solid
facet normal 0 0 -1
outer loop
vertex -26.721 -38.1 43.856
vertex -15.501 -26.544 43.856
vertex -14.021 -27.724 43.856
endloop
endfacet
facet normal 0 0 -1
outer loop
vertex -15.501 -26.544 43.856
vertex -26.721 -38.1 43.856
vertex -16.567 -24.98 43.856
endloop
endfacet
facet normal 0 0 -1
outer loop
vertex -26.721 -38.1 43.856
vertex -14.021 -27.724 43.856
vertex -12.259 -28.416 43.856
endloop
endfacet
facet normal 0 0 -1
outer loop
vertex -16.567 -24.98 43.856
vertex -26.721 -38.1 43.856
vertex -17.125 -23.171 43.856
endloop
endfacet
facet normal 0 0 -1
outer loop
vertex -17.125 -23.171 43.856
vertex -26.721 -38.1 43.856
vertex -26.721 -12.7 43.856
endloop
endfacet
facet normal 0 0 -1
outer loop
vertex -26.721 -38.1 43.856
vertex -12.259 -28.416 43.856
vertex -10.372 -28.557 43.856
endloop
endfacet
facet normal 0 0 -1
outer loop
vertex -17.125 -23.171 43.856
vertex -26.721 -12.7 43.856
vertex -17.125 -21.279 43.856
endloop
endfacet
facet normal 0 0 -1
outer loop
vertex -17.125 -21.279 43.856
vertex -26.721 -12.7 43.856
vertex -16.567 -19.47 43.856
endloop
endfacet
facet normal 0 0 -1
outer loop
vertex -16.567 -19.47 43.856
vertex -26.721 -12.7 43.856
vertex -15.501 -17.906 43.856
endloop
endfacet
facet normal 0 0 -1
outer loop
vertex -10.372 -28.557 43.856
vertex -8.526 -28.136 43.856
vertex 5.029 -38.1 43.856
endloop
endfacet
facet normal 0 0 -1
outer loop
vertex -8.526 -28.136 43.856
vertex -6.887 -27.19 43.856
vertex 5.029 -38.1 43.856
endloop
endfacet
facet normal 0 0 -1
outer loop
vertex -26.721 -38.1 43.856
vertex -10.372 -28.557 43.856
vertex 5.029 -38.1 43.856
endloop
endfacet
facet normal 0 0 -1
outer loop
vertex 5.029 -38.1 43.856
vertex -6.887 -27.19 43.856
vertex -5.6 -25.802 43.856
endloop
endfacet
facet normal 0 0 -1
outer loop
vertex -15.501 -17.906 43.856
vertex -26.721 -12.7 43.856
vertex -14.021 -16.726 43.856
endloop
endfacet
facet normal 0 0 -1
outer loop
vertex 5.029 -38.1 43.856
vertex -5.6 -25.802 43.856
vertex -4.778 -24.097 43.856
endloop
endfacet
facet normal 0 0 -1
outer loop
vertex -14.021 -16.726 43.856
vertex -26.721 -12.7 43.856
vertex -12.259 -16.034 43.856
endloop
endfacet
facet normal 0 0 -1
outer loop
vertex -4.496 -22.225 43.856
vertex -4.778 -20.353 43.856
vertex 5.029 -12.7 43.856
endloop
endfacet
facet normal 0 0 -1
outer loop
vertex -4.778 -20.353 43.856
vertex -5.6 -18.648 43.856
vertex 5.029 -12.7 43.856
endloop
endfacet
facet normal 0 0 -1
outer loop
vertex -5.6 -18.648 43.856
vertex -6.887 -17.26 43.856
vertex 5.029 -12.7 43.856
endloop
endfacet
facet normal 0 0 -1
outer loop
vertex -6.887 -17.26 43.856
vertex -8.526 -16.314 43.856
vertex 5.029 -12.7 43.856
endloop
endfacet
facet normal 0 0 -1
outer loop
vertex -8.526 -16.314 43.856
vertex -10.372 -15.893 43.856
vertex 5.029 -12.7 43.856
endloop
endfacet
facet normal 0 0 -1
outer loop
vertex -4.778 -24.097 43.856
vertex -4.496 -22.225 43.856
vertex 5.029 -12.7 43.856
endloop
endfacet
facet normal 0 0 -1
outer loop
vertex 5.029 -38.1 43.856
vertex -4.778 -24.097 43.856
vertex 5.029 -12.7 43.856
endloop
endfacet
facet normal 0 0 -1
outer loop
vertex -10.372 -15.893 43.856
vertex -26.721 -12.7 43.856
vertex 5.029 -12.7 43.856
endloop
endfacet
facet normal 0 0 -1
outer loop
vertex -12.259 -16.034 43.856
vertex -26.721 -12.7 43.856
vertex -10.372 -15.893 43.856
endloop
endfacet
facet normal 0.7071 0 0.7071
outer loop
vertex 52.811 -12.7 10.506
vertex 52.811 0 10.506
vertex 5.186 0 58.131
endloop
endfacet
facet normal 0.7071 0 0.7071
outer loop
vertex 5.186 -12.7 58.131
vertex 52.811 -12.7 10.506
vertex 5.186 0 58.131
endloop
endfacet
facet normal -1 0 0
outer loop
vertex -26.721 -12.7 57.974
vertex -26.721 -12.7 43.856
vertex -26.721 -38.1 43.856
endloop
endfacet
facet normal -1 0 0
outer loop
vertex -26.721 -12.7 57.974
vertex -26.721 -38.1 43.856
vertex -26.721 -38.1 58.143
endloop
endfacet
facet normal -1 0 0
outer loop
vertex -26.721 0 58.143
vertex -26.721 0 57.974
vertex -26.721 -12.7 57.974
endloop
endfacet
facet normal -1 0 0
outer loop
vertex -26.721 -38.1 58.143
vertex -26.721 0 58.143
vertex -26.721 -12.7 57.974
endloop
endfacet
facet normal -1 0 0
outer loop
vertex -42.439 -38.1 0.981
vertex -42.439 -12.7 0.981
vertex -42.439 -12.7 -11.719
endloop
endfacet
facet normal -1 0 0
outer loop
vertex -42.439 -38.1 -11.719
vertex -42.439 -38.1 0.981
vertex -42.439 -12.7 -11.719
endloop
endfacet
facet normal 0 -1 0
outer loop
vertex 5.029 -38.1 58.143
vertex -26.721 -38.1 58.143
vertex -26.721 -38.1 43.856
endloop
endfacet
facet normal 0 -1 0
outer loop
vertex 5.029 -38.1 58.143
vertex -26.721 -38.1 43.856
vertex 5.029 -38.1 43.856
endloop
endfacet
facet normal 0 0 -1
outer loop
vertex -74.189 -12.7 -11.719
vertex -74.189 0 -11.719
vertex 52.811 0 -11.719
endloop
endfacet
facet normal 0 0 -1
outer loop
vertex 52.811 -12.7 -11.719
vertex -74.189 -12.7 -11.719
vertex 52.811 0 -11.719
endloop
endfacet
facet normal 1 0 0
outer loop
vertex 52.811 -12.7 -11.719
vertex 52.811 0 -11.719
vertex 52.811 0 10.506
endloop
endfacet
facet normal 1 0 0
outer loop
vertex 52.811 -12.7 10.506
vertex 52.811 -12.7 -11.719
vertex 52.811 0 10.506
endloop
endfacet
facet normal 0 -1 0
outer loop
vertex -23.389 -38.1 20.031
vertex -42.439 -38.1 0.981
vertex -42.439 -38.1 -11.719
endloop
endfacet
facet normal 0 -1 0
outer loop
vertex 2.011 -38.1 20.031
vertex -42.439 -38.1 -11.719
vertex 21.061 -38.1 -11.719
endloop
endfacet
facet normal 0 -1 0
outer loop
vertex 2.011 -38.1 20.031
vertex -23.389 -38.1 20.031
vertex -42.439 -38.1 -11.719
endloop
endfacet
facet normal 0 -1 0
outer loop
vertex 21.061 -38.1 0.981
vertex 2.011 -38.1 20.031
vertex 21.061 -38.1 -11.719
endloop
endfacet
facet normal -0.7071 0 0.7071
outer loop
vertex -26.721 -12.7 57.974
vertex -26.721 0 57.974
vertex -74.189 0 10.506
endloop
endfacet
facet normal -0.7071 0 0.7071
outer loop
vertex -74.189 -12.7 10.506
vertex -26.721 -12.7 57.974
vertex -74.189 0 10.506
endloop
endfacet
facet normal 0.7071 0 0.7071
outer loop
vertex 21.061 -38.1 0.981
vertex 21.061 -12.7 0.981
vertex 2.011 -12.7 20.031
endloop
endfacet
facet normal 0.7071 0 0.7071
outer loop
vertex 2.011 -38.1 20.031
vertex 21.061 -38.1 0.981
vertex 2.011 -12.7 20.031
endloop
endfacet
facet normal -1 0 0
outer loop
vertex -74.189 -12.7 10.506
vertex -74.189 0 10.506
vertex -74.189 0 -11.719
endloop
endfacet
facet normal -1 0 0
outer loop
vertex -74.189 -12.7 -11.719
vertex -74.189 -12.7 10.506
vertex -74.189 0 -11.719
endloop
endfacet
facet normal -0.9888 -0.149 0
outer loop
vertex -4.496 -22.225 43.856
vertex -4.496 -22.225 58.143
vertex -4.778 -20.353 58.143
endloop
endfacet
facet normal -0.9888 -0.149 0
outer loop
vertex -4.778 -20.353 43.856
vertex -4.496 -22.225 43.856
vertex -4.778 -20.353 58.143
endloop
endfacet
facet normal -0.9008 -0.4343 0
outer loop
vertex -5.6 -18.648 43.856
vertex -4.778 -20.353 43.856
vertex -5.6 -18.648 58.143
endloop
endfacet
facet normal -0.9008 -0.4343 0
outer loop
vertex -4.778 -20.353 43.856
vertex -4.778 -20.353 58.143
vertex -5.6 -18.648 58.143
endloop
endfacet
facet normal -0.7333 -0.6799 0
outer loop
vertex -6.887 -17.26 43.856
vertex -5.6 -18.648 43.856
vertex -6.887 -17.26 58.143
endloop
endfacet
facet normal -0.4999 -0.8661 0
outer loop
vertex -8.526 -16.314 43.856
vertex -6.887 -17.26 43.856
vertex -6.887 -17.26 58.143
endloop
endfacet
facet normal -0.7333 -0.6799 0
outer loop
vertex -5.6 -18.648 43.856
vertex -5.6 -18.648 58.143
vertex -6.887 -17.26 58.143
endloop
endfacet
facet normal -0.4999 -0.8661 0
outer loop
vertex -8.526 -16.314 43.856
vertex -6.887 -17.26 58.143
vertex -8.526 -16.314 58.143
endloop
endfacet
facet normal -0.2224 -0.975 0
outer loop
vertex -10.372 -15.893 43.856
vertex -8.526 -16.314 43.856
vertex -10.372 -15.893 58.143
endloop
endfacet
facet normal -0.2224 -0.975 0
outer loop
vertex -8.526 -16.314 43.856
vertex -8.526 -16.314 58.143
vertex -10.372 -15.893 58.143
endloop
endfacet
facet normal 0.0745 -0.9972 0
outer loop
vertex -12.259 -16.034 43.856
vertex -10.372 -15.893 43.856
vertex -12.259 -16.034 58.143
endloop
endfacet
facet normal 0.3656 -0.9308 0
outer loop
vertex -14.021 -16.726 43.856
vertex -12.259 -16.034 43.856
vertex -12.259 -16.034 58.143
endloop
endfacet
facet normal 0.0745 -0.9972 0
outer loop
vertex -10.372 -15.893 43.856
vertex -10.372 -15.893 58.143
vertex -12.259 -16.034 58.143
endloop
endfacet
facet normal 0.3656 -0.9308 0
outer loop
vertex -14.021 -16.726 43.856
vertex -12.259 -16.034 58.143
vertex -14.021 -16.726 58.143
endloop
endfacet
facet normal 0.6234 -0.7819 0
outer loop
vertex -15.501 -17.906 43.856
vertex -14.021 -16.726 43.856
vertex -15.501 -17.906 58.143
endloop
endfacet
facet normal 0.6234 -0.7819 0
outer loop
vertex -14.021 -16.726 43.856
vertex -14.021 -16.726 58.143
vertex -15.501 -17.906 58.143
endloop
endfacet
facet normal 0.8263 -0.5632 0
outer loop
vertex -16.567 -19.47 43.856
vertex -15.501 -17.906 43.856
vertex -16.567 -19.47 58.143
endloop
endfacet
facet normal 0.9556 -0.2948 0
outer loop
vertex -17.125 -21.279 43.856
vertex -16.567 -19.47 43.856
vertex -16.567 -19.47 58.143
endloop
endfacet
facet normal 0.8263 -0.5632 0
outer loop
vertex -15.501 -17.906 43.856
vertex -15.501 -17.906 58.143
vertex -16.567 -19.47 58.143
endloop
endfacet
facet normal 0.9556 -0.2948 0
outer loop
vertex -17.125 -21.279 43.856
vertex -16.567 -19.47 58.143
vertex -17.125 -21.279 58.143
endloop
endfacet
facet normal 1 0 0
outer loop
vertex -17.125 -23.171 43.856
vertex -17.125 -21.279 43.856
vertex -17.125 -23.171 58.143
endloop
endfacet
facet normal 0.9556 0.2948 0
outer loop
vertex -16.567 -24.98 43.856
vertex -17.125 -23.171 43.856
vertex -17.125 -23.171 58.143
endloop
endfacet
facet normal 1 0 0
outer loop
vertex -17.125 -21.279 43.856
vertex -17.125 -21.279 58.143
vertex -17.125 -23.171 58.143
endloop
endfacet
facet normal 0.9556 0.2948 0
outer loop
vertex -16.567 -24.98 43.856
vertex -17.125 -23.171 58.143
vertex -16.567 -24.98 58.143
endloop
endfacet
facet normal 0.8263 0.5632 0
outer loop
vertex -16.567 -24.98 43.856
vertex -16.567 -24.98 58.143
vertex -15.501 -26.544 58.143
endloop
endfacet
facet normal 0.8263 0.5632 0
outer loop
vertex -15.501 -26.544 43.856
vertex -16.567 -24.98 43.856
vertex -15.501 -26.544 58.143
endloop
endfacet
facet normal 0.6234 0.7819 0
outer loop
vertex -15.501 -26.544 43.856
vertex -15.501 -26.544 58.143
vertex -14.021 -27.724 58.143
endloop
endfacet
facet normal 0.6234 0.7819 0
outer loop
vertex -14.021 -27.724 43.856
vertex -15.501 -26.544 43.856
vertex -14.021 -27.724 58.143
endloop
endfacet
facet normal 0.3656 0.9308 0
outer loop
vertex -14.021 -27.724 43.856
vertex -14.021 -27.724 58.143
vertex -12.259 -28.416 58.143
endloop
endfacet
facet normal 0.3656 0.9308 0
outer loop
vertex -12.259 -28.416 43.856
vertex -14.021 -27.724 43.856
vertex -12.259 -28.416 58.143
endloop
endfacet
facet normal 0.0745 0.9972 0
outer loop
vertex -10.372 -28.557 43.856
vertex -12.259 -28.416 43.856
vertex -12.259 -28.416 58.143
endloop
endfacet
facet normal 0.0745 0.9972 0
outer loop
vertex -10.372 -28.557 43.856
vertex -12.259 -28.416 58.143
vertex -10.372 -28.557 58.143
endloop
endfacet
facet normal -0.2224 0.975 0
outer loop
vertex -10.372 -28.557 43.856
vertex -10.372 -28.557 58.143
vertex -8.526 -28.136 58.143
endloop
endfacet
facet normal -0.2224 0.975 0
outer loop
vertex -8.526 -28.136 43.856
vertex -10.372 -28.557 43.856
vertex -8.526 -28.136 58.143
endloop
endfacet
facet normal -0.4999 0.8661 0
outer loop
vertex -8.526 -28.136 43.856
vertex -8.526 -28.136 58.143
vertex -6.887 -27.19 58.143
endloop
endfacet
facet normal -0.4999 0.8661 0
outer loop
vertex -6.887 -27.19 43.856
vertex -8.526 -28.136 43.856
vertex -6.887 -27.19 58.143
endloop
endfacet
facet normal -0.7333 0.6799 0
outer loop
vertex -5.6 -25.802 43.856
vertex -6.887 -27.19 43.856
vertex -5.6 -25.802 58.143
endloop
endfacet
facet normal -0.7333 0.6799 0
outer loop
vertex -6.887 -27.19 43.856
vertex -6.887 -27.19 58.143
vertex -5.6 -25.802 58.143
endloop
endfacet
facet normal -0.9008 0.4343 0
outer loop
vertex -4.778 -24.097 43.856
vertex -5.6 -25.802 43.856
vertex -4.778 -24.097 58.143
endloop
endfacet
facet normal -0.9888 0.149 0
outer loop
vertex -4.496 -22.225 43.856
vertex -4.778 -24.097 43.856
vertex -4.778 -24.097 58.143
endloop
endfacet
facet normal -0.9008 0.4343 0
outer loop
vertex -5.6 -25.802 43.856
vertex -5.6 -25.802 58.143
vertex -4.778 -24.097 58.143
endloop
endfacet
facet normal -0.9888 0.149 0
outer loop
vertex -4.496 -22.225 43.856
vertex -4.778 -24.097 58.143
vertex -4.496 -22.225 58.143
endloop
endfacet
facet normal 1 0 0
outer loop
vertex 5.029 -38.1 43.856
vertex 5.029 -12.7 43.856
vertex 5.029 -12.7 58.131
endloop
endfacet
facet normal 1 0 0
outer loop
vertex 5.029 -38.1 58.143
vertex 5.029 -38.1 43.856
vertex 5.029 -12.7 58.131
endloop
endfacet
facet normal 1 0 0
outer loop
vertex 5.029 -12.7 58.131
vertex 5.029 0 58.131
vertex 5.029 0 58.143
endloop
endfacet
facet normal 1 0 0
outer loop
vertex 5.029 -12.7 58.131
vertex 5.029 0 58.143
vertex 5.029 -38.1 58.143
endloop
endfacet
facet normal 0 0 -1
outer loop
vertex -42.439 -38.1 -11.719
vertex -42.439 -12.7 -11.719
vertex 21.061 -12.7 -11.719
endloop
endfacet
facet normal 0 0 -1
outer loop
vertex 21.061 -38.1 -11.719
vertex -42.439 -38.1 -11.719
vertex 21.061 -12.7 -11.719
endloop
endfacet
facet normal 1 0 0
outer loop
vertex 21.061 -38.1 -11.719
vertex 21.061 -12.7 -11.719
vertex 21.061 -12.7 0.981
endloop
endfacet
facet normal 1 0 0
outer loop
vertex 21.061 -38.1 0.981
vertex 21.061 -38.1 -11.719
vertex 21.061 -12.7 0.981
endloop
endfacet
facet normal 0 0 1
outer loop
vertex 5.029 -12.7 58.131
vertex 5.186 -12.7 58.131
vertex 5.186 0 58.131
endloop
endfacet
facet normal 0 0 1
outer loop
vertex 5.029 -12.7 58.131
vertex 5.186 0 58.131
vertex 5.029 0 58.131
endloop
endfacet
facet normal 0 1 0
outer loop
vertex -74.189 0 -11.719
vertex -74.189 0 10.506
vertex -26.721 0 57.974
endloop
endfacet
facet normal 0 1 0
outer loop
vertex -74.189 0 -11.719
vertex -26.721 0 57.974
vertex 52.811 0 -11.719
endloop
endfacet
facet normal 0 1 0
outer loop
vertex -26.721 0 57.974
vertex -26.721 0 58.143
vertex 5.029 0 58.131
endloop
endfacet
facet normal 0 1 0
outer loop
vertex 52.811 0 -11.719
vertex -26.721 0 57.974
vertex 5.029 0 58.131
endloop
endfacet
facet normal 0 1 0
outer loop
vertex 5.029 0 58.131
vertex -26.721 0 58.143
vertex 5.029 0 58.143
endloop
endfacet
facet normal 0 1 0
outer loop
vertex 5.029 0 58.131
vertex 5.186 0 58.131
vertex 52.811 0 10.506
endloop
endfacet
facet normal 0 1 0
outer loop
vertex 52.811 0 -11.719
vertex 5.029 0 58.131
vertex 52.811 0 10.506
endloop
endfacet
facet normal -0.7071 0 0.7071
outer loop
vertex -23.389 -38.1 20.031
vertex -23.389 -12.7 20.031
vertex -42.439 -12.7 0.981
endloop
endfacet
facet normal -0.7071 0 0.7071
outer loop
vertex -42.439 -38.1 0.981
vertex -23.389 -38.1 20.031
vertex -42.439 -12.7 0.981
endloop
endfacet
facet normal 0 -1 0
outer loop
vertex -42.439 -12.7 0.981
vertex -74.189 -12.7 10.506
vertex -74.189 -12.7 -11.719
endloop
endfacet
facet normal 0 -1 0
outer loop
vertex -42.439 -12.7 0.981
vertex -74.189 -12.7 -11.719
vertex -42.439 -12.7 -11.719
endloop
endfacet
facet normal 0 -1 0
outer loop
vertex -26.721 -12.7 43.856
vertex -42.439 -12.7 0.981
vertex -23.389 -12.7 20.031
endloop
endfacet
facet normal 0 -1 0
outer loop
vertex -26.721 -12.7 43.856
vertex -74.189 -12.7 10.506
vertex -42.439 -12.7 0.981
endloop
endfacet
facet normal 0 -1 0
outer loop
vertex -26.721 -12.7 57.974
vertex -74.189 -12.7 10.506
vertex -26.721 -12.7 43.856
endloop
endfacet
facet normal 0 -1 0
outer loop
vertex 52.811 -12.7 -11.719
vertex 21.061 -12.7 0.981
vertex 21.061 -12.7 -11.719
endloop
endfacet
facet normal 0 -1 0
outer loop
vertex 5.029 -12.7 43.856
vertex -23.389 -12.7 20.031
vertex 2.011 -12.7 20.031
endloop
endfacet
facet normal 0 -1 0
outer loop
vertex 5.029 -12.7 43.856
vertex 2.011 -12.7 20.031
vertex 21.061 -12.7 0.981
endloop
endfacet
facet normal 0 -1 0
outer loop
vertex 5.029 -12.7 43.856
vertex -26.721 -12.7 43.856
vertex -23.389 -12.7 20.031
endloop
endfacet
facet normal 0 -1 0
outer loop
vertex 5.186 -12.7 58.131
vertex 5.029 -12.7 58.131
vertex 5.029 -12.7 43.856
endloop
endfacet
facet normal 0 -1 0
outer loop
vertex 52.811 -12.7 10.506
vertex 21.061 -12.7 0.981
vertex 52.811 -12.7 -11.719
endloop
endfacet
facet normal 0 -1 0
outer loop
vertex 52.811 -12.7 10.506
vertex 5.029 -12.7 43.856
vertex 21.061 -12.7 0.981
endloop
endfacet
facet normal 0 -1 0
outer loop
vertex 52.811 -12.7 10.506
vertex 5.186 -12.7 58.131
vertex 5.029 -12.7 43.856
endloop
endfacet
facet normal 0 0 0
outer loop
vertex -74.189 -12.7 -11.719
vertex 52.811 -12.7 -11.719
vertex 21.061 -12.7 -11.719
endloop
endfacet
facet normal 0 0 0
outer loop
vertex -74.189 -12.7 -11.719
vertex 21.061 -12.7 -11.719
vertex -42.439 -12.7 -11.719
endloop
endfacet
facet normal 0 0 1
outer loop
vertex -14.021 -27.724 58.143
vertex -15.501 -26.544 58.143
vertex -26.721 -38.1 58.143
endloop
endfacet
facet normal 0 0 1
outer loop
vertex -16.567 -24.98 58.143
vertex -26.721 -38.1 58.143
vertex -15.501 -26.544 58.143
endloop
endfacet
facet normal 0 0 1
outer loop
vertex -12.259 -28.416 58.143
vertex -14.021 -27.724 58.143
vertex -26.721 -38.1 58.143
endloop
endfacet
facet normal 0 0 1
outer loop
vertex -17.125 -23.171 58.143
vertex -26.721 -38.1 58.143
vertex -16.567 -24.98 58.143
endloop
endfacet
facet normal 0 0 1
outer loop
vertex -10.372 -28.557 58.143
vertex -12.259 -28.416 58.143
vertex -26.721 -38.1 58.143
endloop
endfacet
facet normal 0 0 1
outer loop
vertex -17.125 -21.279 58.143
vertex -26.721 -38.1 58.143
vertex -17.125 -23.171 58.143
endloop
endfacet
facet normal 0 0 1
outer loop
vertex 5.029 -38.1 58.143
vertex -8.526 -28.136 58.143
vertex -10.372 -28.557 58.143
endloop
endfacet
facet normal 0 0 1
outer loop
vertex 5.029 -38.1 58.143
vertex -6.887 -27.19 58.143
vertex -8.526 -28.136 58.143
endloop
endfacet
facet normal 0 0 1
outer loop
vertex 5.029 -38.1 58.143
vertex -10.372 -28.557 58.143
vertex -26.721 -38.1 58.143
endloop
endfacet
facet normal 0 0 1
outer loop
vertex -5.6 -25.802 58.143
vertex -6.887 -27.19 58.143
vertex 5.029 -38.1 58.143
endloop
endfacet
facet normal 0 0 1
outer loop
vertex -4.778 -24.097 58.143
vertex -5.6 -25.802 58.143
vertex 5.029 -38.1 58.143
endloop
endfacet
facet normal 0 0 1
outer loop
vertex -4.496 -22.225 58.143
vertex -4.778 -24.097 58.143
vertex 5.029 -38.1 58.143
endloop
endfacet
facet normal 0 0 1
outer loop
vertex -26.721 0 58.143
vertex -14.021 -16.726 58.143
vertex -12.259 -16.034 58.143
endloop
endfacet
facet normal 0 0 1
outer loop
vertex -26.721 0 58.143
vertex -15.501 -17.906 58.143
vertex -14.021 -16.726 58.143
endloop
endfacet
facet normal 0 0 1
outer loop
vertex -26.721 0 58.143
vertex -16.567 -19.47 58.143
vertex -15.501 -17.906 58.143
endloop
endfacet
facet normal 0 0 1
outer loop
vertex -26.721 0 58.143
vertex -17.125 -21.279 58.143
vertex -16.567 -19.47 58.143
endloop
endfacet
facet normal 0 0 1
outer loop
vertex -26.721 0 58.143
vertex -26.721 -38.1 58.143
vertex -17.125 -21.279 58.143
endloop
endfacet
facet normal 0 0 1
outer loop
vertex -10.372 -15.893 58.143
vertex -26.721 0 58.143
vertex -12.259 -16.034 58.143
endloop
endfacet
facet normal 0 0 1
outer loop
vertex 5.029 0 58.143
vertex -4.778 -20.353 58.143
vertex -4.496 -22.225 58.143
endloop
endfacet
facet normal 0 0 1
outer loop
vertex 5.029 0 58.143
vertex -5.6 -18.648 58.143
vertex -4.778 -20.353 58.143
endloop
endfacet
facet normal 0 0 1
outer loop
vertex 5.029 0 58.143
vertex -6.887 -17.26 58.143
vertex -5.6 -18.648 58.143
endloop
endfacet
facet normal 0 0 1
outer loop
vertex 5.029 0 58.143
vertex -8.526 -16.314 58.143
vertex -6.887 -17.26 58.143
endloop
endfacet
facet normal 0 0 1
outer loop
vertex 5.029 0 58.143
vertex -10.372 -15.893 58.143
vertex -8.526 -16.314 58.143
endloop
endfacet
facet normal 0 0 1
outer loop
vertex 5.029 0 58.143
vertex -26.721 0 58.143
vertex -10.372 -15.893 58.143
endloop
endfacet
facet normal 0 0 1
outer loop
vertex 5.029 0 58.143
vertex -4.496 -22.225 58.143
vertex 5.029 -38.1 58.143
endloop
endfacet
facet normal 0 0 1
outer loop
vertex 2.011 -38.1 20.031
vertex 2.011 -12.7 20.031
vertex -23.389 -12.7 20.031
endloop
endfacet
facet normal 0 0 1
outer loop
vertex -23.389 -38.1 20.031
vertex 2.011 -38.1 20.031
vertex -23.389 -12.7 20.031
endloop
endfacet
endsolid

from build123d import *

# Parameters (mm, degrees)
F1_DEPTH = 12.7
F3_DEPTH = 38.1
F4_W     = 31.75
F4_H     = 14.2875
F5_DEPTH = 38.1
F6_R     = 6.35
F7_DEPTH = 14.2875


with BuildPart() as f1:
    # F0 (on Front) → F1 (new body)
    with BuildSketch(Plane.XZ):
        Polygon((-74.188948, 10.506319), (-74.188948, -11.718681), (52.811052, -11.718681), (52.811052, 10.506319), (5.186052, 58.131319), (-26.563948, 58.131319), align=None)
    extrude(amount=F1_DEPTH)

    # F2 (on Front) → F3 (join)
    with BuildSketch(Plane.XZ):
        Polygon((-42.438948, 0.981418), (-42.438948, -11.718582), (21.061052, -11.718582), (21.061052, 0.981418), (2.011052, 20.031418), (-23.388948, 20.031418), align=None)
    extrude(amount=F3_DEPTH)

    # F4 (on Front) → F5 (join)
    with BuildSketch(Plane.XZ):
        with Locations((-10.846151, 50.999742)):
            Rectangle(F4_W, F4_H)
    extrude(amount=F5_DEPTH)

    # F6 (on face) → F7 (cut)
    with BuildSketch(Plane.XY.offset(58.143492)):
        with Locations((-10.846151, -22.225)):
            Circle(F6_R)
    extrude(amount=-F7_DEPTH, mode=Mode.SUBTRACT)


solid = f1.part
